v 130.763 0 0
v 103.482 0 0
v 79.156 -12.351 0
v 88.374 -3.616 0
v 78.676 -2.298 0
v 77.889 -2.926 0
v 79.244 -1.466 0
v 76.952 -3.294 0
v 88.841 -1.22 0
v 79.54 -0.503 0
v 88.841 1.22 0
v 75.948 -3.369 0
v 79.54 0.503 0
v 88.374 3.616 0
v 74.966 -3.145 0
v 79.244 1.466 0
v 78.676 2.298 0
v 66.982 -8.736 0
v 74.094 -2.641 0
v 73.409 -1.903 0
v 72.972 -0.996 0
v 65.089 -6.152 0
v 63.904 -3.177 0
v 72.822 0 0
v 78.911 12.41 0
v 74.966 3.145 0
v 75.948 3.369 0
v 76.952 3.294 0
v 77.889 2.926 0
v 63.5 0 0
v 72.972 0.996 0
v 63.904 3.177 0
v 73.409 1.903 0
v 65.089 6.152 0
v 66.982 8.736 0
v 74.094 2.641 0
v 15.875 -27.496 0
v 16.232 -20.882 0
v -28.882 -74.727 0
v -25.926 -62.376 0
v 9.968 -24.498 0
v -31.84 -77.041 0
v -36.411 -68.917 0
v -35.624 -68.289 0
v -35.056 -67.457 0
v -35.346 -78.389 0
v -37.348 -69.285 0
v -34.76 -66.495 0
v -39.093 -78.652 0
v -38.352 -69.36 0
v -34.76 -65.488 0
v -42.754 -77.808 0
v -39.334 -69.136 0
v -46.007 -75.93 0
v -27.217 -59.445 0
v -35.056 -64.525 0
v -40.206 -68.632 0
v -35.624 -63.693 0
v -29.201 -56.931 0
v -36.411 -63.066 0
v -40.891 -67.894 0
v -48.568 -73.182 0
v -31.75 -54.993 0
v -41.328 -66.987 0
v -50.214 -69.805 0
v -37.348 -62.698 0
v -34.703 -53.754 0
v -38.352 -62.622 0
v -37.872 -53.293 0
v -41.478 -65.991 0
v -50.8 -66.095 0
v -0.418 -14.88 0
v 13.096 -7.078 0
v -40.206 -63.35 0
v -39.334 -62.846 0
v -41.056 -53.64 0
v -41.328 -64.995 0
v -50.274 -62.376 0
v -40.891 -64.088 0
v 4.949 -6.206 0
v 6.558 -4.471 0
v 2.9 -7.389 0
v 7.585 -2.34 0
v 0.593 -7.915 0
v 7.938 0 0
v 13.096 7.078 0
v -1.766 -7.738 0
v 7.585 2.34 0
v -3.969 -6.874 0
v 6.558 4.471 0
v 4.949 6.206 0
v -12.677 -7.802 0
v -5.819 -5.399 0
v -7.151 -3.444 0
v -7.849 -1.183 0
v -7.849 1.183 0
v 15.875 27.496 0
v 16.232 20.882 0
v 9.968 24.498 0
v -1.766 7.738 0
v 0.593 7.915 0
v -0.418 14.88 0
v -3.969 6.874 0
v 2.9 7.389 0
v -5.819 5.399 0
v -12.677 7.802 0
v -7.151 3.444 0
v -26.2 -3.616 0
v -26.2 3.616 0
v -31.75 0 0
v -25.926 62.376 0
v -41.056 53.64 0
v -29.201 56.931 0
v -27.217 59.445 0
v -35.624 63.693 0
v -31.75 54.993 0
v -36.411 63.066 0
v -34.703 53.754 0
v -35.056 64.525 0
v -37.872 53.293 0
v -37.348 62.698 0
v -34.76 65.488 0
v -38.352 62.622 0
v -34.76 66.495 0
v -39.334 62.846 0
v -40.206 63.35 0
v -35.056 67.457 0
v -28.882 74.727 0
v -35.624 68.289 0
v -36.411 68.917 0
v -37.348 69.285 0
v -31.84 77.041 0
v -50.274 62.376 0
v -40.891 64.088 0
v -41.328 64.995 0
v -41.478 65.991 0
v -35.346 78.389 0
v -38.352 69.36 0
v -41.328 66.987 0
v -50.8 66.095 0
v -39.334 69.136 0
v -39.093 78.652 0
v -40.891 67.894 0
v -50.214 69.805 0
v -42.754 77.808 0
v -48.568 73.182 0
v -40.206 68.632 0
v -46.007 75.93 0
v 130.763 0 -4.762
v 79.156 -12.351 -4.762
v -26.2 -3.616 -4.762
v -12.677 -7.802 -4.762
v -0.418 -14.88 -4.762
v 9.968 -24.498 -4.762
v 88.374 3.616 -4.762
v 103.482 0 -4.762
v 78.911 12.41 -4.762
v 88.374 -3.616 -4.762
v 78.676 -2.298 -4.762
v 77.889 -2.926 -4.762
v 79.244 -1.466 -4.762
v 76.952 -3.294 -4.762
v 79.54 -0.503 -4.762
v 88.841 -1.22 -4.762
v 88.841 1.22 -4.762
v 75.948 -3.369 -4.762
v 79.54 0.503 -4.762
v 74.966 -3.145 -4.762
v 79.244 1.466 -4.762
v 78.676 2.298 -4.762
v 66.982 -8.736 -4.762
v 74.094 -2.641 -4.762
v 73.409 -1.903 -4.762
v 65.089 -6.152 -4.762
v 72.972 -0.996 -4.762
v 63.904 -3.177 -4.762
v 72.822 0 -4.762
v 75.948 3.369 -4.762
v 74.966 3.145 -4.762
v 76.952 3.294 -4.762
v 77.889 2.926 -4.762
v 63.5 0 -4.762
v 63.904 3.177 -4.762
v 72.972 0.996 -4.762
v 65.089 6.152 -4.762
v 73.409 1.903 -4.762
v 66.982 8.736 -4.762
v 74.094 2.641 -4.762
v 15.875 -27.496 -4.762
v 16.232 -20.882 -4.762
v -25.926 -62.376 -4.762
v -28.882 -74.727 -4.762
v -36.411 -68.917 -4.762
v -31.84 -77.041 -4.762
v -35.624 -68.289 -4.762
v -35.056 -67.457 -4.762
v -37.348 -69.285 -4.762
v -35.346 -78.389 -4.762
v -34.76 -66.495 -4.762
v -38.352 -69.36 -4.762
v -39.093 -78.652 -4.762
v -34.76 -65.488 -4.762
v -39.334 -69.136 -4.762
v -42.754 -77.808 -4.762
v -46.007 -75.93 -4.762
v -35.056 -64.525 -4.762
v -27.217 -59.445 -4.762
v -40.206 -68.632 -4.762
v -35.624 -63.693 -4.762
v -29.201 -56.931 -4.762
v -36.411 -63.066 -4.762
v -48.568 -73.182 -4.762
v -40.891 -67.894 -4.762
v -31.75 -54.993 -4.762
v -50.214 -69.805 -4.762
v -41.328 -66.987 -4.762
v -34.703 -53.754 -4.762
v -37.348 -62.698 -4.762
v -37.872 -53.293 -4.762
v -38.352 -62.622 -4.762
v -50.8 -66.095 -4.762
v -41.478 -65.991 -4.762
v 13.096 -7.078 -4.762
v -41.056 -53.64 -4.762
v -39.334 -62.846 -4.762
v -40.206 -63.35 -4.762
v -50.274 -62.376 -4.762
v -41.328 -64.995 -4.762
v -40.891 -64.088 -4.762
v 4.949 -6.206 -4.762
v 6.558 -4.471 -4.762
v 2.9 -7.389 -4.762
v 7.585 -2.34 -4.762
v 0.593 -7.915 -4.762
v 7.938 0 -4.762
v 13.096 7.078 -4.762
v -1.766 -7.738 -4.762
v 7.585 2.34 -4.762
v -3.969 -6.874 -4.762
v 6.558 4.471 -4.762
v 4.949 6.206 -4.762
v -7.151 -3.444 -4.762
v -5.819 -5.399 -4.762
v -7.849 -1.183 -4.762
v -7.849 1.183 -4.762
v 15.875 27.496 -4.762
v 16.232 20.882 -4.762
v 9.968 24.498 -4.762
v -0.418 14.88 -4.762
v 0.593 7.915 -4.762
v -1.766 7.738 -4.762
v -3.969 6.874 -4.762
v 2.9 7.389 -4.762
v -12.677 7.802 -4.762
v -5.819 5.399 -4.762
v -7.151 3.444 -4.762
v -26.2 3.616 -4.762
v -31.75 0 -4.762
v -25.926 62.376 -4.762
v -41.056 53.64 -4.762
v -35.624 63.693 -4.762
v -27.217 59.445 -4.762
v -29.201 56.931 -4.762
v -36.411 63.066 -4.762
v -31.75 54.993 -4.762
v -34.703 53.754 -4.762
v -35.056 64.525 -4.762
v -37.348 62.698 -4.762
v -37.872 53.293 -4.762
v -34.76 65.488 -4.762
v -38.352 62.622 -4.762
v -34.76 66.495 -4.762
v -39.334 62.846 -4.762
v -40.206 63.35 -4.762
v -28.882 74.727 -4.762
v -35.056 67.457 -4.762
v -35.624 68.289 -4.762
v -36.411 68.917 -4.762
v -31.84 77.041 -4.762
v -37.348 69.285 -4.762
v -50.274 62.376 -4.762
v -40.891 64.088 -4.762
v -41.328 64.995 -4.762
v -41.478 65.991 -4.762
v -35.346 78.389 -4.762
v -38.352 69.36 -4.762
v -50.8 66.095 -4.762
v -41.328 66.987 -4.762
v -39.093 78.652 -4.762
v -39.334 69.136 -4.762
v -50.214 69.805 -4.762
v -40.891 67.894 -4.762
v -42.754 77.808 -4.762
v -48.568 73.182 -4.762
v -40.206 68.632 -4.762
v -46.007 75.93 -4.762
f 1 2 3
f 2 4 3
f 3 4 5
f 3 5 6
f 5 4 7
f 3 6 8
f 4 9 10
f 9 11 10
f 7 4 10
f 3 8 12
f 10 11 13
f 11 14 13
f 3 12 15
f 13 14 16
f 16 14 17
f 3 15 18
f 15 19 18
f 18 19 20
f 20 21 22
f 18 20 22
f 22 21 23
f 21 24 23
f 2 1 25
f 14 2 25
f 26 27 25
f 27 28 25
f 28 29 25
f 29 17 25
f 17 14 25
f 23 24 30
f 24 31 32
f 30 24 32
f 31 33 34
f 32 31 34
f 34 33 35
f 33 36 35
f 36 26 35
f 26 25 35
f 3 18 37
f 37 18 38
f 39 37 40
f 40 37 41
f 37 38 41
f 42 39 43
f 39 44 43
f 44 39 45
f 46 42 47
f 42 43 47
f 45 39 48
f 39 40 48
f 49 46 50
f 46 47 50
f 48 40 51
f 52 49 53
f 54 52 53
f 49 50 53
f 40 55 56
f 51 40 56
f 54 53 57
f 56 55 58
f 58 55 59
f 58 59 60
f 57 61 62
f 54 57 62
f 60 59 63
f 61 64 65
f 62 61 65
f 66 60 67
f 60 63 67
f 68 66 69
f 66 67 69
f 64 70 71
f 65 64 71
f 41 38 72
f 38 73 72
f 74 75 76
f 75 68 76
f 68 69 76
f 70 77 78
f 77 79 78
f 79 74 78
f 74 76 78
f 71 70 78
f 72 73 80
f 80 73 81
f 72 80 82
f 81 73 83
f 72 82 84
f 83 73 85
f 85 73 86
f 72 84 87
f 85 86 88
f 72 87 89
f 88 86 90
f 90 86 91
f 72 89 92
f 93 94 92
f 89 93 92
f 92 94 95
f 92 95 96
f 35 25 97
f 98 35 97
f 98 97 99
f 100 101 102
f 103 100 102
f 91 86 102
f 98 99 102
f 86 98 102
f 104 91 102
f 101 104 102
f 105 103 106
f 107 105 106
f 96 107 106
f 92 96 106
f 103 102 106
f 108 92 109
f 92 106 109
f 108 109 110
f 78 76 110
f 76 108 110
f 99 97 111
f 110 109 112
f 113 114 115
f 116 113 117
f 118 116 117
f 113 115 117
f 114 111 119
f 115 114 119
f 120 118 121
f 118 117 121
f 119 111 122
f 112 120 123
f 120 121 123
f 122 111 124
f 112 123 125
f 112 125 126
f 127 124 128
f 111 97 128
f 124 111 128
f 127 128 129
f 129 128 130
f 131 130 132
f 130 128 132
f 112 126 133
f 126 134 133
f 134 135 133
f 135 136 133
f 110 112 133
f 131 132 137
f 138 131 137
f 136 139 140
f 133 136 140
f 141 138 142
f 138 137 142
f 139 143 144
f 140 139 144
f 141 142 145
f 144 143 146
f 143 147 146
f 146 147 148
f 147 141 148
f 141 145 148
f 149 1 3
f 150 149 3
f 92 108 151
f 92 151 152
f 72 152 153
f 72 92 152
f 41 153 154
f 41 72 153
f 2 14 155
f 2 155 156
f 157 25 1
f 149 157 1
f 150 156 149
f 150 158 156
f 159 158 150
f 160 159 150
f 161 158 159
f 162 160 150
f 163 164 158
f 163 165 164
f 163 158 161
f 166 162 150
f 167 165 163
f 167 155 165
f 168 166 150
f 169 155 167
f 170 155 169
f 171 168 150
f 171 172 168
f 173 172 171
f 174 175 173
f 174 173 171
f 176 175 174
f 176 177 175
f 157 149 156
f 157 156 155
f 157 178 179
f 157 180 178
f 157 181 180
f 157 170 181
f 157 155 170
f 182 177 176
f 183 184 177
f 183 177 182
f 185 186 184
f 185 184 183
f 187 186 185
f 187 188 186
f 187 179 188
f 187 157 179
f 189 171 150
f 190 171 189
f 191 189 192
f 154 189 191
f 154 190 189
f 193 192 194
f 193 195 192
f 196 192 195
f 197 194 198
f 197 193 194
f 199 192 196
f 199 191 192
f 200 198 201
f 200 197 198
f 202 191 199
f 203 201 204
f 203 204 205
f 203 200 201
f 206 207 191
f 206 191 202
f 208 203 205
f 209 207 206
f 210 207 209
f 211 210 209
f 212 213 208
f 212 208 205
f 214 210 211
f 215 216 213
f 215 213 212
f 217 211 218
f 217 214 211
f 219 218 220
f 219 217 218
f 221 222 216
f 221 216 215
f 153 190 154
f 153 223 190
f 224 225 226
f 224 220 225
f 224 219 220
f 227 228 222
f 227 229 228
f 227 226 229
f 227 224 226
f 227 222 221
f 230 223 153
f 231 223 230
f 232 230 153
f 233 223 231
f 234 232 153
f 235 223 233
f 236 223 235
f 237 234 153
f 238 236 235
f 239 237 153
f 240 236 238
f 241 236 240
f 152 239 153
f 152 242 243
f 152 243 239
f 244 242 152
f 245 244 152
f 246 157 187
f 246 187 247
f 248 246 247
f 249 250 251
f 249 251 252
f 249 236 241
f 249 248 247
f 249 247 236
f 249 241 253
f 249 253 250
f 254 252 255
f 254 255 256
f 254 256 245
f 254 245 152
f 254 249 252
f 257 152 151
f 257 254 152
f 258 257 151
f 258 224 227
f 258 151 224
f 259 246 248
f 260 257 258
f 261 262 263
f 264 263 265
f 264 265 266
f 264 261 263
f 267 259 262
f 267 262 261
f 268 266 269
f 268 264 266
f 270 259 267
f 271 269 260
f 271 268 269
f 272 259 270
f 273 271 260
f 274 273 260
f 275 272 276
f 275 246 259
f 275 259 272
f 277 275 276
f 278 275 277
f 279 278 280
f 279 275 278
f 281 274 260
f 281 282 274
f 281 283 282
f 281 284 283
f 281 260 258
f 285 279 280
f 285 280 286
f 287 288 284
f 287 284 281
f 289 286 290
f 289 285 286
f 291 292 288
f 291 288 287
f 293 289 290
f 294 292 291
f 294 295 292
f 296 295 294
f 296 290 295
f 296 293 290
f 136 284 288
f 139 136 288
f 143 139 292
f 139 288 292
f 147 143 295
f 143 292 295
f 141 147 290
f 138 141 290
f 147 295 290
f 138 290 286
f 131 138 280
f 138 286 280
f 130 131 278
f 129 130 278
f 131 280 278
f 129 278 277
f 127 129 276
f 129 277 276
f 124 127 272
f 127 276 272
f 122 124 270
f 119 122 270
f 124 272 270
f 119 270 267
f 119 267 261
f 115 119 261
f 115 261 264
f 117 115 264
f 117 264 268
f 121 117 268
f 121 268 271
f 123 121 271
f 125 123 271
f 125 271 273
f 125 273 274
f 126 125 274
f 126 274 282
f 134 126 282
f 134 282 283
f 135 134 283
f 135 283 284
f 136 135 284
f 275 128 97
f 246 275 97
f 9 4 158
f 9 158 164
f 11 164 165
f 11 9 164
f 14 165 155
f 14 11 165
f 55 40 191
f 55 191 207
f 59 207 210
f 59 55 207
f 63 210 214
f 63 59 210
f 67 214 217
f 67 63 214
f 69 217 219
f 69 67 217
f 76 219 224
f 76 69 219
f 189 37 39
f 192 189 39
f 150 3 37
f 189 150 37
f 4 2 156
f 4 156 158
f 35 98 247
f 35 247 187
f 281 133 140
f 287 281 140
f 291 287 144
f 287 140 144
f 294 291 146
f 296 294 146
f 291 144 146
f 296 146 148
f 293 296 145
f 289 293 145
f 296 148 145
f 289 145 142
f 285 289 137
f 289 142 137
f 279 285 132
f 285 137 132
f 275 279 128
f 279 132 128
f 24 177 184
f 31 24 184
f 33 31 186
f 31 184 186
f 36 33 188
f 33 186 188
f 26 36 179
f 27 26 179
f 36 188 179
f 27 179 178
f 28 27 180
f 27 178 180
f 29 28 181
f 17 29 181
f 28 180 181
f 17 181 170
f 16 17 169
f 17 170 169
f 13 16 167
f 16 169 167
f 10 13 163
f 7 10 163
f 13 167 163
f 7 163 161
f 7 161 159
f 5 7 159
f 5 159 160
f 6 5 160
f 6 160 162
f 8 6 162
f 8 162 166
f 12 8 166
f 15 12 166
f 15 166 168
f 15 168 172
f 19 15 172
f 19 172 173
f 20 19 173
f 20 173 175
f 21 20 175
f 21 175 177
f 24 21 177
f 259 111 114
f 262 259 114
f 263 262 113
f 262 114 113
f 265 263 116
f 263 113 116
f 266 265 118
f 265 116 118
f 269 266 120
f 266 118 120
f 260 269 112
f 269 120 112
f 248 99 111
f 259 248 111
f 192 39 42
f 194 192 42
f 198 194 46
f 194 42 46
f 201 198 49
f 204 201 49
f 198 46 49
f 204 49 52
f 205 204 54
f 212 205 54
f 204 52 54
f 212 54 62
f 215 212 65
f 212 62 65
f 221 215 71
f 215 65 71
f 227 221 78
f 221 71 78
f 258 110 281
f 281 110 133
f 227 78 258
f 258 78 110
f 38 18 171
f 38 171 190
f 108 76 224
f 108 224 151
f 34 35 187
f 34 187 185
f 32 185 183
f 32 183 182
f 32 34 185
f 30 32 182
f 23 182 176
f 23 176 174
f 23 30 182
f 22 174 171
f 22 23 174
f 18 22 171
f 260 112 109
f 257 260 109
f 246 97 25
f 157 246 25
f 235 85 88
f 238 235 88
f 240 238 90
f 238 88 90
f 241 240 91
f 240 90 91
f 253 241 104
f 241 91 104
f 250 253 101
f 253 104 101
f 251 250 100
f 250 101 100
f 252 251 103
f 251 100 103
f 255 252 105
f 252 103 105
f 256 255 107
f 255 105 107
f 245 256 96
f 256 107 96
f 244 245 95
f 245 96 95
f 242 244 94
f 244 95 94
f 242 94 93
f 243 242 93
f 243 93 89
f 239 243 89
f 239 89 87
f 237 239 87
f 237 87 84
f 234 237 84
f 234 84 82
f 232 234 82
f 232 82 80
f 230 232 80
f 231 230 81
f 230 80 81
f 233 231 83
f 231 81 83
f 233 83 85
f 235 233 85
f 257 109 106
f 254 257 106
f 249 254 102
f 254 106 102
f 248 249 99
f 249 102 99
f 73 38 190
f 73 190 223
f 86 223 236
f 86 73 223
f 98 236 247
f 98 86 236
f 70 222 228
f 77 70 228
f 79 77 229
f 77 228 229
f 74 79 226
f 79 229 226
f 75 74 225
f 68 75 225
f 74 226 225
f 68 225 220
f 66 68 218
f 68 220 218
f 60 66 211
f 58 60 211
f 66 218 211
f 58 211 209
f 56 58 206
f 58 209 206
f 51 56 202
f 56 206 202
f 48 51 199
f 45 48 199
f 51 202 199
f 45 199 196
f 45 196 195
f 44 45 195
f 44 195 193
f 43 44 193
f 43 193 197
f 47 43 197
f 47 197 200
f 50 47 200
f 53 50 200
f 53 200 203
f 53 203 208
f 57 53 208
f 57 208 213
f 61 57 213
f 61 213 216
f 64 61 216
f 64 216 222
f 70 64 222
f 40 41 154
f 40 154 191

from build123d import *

# Parameters (mm, degrees)
SKETCH1_R                = 7.9375
BOSS_EXTRUDE1_DEPTH      = 4.7625
H_0_266_DIAMETER_HOLE1_D = 6.7564


with BuildPart() as part:
    # Sketch1 → Boss-Extrude1 (new body)
    with BuildSketch(Plane.XY):
        with BuildLine():
            Line((-31.75, 0), (-50.274457233, 62.375531935))
            ThreePointArc((-50.274457233, 62.375531935), (-44.45, 76.989658396), (-28.881566614, 74.726723093))
            Line((-28.881566614, 74.726723093), (15.875, 27.49630657))
            Line((15.875, 27.49630657), (78.9111987, 12.409785423))
            Line((78.9111987, 12.409785423), (130.763159277, 0))
            Line((130.763159277, 0), (79.156023847, -12.351191158))
            Line((79.156023847, -12.351191158), (15.875, -27.49630657))
            Line((15.875, -27.49630657), (-28.881566614, -74.726723093))
            ThreePointArc((-28.881566614, -74.726723093), (-44.45, -76.989658396), (-50.274457233, -62.375531935))
            Line((-50.274457233, -62.375531935), (-31.75, 0))
        make_face()
        Circle(SKETCH1_R, mode=Mode.SUBTRACT)
        with BuildLine():
            Line((9.968214912, 24.497802386), (-25.925542767, 62.375531935))
            ThreePointArc((-25.925542767, 62.375531935), (-31.75, 54.99261314), (-41.056023847, 53.639944611))
            Line((-41.056023847, 53.639944611), (-26.199826659, 3.616173849))
            ThreePointArc((-26.199826659, 3.616173849), (-6.35, 10.998522628), (9.968214912, 24.497802386))
        make_face(mode=Mode.SUBTRACT)
        with BuildLine():
            Line((16.231611747, 20.881628537), (66.981566614, 8.735587325))
            ThreePointArc((66.981566614, 8.735587325), (63.5, 0), (66.981566614, -8.735587325))
            Line((66.981566614, -8.735587325), (16.231611747, -20.881628537))
            ThreePointArc((16.231611747, -20.881628537), (12.7, 0), (16.231611747, 20.881628537))
        make_face(mode=Mode.SUBTRACT)
        with BuildLine():
            Line((88.374457233, 3.615603833), (103.481579639, 0))
            Line((103.481579639, 0), (88.374457233, -3.615603833))
            ThreePointArc((88.374457233, -3.615603833), (88.9, 0), (88.374457233, 3.615603833))
        make_face(mode=Mode.SUBTRACT)
        with BuildLine():
            Line((9.968214912, -24.497802386), (-25.925542767, -62.375531935))
            ThreePointArc((-25.925542767, -62.375531935), (-31.75, -54.99261314), (-41.056023847, -53.639944611))
            Line((-41.056023847, -53.639944611), (-26.199826659, -3.616173849))
            ThreePointArc((-26.199826659, -3.616173849), (-6.35, -10.998522628), (9.968214912, -24.497802386))
        make_face(mode=Mode.SUBTRACT)
    extrude(amount=-BOSS_EXTRUDE1_DEPTH)

    # H (0.266) Diameter Hole1 (through all)
    with Locations(Plane.XY):
        with Locations((76.2, 0), (-38.1, 65.991135768), (-38.1, -65.991135768)):
            Hole(H_0_266_DIAMETER_HOLE1_D / 2)


solid = part.part
